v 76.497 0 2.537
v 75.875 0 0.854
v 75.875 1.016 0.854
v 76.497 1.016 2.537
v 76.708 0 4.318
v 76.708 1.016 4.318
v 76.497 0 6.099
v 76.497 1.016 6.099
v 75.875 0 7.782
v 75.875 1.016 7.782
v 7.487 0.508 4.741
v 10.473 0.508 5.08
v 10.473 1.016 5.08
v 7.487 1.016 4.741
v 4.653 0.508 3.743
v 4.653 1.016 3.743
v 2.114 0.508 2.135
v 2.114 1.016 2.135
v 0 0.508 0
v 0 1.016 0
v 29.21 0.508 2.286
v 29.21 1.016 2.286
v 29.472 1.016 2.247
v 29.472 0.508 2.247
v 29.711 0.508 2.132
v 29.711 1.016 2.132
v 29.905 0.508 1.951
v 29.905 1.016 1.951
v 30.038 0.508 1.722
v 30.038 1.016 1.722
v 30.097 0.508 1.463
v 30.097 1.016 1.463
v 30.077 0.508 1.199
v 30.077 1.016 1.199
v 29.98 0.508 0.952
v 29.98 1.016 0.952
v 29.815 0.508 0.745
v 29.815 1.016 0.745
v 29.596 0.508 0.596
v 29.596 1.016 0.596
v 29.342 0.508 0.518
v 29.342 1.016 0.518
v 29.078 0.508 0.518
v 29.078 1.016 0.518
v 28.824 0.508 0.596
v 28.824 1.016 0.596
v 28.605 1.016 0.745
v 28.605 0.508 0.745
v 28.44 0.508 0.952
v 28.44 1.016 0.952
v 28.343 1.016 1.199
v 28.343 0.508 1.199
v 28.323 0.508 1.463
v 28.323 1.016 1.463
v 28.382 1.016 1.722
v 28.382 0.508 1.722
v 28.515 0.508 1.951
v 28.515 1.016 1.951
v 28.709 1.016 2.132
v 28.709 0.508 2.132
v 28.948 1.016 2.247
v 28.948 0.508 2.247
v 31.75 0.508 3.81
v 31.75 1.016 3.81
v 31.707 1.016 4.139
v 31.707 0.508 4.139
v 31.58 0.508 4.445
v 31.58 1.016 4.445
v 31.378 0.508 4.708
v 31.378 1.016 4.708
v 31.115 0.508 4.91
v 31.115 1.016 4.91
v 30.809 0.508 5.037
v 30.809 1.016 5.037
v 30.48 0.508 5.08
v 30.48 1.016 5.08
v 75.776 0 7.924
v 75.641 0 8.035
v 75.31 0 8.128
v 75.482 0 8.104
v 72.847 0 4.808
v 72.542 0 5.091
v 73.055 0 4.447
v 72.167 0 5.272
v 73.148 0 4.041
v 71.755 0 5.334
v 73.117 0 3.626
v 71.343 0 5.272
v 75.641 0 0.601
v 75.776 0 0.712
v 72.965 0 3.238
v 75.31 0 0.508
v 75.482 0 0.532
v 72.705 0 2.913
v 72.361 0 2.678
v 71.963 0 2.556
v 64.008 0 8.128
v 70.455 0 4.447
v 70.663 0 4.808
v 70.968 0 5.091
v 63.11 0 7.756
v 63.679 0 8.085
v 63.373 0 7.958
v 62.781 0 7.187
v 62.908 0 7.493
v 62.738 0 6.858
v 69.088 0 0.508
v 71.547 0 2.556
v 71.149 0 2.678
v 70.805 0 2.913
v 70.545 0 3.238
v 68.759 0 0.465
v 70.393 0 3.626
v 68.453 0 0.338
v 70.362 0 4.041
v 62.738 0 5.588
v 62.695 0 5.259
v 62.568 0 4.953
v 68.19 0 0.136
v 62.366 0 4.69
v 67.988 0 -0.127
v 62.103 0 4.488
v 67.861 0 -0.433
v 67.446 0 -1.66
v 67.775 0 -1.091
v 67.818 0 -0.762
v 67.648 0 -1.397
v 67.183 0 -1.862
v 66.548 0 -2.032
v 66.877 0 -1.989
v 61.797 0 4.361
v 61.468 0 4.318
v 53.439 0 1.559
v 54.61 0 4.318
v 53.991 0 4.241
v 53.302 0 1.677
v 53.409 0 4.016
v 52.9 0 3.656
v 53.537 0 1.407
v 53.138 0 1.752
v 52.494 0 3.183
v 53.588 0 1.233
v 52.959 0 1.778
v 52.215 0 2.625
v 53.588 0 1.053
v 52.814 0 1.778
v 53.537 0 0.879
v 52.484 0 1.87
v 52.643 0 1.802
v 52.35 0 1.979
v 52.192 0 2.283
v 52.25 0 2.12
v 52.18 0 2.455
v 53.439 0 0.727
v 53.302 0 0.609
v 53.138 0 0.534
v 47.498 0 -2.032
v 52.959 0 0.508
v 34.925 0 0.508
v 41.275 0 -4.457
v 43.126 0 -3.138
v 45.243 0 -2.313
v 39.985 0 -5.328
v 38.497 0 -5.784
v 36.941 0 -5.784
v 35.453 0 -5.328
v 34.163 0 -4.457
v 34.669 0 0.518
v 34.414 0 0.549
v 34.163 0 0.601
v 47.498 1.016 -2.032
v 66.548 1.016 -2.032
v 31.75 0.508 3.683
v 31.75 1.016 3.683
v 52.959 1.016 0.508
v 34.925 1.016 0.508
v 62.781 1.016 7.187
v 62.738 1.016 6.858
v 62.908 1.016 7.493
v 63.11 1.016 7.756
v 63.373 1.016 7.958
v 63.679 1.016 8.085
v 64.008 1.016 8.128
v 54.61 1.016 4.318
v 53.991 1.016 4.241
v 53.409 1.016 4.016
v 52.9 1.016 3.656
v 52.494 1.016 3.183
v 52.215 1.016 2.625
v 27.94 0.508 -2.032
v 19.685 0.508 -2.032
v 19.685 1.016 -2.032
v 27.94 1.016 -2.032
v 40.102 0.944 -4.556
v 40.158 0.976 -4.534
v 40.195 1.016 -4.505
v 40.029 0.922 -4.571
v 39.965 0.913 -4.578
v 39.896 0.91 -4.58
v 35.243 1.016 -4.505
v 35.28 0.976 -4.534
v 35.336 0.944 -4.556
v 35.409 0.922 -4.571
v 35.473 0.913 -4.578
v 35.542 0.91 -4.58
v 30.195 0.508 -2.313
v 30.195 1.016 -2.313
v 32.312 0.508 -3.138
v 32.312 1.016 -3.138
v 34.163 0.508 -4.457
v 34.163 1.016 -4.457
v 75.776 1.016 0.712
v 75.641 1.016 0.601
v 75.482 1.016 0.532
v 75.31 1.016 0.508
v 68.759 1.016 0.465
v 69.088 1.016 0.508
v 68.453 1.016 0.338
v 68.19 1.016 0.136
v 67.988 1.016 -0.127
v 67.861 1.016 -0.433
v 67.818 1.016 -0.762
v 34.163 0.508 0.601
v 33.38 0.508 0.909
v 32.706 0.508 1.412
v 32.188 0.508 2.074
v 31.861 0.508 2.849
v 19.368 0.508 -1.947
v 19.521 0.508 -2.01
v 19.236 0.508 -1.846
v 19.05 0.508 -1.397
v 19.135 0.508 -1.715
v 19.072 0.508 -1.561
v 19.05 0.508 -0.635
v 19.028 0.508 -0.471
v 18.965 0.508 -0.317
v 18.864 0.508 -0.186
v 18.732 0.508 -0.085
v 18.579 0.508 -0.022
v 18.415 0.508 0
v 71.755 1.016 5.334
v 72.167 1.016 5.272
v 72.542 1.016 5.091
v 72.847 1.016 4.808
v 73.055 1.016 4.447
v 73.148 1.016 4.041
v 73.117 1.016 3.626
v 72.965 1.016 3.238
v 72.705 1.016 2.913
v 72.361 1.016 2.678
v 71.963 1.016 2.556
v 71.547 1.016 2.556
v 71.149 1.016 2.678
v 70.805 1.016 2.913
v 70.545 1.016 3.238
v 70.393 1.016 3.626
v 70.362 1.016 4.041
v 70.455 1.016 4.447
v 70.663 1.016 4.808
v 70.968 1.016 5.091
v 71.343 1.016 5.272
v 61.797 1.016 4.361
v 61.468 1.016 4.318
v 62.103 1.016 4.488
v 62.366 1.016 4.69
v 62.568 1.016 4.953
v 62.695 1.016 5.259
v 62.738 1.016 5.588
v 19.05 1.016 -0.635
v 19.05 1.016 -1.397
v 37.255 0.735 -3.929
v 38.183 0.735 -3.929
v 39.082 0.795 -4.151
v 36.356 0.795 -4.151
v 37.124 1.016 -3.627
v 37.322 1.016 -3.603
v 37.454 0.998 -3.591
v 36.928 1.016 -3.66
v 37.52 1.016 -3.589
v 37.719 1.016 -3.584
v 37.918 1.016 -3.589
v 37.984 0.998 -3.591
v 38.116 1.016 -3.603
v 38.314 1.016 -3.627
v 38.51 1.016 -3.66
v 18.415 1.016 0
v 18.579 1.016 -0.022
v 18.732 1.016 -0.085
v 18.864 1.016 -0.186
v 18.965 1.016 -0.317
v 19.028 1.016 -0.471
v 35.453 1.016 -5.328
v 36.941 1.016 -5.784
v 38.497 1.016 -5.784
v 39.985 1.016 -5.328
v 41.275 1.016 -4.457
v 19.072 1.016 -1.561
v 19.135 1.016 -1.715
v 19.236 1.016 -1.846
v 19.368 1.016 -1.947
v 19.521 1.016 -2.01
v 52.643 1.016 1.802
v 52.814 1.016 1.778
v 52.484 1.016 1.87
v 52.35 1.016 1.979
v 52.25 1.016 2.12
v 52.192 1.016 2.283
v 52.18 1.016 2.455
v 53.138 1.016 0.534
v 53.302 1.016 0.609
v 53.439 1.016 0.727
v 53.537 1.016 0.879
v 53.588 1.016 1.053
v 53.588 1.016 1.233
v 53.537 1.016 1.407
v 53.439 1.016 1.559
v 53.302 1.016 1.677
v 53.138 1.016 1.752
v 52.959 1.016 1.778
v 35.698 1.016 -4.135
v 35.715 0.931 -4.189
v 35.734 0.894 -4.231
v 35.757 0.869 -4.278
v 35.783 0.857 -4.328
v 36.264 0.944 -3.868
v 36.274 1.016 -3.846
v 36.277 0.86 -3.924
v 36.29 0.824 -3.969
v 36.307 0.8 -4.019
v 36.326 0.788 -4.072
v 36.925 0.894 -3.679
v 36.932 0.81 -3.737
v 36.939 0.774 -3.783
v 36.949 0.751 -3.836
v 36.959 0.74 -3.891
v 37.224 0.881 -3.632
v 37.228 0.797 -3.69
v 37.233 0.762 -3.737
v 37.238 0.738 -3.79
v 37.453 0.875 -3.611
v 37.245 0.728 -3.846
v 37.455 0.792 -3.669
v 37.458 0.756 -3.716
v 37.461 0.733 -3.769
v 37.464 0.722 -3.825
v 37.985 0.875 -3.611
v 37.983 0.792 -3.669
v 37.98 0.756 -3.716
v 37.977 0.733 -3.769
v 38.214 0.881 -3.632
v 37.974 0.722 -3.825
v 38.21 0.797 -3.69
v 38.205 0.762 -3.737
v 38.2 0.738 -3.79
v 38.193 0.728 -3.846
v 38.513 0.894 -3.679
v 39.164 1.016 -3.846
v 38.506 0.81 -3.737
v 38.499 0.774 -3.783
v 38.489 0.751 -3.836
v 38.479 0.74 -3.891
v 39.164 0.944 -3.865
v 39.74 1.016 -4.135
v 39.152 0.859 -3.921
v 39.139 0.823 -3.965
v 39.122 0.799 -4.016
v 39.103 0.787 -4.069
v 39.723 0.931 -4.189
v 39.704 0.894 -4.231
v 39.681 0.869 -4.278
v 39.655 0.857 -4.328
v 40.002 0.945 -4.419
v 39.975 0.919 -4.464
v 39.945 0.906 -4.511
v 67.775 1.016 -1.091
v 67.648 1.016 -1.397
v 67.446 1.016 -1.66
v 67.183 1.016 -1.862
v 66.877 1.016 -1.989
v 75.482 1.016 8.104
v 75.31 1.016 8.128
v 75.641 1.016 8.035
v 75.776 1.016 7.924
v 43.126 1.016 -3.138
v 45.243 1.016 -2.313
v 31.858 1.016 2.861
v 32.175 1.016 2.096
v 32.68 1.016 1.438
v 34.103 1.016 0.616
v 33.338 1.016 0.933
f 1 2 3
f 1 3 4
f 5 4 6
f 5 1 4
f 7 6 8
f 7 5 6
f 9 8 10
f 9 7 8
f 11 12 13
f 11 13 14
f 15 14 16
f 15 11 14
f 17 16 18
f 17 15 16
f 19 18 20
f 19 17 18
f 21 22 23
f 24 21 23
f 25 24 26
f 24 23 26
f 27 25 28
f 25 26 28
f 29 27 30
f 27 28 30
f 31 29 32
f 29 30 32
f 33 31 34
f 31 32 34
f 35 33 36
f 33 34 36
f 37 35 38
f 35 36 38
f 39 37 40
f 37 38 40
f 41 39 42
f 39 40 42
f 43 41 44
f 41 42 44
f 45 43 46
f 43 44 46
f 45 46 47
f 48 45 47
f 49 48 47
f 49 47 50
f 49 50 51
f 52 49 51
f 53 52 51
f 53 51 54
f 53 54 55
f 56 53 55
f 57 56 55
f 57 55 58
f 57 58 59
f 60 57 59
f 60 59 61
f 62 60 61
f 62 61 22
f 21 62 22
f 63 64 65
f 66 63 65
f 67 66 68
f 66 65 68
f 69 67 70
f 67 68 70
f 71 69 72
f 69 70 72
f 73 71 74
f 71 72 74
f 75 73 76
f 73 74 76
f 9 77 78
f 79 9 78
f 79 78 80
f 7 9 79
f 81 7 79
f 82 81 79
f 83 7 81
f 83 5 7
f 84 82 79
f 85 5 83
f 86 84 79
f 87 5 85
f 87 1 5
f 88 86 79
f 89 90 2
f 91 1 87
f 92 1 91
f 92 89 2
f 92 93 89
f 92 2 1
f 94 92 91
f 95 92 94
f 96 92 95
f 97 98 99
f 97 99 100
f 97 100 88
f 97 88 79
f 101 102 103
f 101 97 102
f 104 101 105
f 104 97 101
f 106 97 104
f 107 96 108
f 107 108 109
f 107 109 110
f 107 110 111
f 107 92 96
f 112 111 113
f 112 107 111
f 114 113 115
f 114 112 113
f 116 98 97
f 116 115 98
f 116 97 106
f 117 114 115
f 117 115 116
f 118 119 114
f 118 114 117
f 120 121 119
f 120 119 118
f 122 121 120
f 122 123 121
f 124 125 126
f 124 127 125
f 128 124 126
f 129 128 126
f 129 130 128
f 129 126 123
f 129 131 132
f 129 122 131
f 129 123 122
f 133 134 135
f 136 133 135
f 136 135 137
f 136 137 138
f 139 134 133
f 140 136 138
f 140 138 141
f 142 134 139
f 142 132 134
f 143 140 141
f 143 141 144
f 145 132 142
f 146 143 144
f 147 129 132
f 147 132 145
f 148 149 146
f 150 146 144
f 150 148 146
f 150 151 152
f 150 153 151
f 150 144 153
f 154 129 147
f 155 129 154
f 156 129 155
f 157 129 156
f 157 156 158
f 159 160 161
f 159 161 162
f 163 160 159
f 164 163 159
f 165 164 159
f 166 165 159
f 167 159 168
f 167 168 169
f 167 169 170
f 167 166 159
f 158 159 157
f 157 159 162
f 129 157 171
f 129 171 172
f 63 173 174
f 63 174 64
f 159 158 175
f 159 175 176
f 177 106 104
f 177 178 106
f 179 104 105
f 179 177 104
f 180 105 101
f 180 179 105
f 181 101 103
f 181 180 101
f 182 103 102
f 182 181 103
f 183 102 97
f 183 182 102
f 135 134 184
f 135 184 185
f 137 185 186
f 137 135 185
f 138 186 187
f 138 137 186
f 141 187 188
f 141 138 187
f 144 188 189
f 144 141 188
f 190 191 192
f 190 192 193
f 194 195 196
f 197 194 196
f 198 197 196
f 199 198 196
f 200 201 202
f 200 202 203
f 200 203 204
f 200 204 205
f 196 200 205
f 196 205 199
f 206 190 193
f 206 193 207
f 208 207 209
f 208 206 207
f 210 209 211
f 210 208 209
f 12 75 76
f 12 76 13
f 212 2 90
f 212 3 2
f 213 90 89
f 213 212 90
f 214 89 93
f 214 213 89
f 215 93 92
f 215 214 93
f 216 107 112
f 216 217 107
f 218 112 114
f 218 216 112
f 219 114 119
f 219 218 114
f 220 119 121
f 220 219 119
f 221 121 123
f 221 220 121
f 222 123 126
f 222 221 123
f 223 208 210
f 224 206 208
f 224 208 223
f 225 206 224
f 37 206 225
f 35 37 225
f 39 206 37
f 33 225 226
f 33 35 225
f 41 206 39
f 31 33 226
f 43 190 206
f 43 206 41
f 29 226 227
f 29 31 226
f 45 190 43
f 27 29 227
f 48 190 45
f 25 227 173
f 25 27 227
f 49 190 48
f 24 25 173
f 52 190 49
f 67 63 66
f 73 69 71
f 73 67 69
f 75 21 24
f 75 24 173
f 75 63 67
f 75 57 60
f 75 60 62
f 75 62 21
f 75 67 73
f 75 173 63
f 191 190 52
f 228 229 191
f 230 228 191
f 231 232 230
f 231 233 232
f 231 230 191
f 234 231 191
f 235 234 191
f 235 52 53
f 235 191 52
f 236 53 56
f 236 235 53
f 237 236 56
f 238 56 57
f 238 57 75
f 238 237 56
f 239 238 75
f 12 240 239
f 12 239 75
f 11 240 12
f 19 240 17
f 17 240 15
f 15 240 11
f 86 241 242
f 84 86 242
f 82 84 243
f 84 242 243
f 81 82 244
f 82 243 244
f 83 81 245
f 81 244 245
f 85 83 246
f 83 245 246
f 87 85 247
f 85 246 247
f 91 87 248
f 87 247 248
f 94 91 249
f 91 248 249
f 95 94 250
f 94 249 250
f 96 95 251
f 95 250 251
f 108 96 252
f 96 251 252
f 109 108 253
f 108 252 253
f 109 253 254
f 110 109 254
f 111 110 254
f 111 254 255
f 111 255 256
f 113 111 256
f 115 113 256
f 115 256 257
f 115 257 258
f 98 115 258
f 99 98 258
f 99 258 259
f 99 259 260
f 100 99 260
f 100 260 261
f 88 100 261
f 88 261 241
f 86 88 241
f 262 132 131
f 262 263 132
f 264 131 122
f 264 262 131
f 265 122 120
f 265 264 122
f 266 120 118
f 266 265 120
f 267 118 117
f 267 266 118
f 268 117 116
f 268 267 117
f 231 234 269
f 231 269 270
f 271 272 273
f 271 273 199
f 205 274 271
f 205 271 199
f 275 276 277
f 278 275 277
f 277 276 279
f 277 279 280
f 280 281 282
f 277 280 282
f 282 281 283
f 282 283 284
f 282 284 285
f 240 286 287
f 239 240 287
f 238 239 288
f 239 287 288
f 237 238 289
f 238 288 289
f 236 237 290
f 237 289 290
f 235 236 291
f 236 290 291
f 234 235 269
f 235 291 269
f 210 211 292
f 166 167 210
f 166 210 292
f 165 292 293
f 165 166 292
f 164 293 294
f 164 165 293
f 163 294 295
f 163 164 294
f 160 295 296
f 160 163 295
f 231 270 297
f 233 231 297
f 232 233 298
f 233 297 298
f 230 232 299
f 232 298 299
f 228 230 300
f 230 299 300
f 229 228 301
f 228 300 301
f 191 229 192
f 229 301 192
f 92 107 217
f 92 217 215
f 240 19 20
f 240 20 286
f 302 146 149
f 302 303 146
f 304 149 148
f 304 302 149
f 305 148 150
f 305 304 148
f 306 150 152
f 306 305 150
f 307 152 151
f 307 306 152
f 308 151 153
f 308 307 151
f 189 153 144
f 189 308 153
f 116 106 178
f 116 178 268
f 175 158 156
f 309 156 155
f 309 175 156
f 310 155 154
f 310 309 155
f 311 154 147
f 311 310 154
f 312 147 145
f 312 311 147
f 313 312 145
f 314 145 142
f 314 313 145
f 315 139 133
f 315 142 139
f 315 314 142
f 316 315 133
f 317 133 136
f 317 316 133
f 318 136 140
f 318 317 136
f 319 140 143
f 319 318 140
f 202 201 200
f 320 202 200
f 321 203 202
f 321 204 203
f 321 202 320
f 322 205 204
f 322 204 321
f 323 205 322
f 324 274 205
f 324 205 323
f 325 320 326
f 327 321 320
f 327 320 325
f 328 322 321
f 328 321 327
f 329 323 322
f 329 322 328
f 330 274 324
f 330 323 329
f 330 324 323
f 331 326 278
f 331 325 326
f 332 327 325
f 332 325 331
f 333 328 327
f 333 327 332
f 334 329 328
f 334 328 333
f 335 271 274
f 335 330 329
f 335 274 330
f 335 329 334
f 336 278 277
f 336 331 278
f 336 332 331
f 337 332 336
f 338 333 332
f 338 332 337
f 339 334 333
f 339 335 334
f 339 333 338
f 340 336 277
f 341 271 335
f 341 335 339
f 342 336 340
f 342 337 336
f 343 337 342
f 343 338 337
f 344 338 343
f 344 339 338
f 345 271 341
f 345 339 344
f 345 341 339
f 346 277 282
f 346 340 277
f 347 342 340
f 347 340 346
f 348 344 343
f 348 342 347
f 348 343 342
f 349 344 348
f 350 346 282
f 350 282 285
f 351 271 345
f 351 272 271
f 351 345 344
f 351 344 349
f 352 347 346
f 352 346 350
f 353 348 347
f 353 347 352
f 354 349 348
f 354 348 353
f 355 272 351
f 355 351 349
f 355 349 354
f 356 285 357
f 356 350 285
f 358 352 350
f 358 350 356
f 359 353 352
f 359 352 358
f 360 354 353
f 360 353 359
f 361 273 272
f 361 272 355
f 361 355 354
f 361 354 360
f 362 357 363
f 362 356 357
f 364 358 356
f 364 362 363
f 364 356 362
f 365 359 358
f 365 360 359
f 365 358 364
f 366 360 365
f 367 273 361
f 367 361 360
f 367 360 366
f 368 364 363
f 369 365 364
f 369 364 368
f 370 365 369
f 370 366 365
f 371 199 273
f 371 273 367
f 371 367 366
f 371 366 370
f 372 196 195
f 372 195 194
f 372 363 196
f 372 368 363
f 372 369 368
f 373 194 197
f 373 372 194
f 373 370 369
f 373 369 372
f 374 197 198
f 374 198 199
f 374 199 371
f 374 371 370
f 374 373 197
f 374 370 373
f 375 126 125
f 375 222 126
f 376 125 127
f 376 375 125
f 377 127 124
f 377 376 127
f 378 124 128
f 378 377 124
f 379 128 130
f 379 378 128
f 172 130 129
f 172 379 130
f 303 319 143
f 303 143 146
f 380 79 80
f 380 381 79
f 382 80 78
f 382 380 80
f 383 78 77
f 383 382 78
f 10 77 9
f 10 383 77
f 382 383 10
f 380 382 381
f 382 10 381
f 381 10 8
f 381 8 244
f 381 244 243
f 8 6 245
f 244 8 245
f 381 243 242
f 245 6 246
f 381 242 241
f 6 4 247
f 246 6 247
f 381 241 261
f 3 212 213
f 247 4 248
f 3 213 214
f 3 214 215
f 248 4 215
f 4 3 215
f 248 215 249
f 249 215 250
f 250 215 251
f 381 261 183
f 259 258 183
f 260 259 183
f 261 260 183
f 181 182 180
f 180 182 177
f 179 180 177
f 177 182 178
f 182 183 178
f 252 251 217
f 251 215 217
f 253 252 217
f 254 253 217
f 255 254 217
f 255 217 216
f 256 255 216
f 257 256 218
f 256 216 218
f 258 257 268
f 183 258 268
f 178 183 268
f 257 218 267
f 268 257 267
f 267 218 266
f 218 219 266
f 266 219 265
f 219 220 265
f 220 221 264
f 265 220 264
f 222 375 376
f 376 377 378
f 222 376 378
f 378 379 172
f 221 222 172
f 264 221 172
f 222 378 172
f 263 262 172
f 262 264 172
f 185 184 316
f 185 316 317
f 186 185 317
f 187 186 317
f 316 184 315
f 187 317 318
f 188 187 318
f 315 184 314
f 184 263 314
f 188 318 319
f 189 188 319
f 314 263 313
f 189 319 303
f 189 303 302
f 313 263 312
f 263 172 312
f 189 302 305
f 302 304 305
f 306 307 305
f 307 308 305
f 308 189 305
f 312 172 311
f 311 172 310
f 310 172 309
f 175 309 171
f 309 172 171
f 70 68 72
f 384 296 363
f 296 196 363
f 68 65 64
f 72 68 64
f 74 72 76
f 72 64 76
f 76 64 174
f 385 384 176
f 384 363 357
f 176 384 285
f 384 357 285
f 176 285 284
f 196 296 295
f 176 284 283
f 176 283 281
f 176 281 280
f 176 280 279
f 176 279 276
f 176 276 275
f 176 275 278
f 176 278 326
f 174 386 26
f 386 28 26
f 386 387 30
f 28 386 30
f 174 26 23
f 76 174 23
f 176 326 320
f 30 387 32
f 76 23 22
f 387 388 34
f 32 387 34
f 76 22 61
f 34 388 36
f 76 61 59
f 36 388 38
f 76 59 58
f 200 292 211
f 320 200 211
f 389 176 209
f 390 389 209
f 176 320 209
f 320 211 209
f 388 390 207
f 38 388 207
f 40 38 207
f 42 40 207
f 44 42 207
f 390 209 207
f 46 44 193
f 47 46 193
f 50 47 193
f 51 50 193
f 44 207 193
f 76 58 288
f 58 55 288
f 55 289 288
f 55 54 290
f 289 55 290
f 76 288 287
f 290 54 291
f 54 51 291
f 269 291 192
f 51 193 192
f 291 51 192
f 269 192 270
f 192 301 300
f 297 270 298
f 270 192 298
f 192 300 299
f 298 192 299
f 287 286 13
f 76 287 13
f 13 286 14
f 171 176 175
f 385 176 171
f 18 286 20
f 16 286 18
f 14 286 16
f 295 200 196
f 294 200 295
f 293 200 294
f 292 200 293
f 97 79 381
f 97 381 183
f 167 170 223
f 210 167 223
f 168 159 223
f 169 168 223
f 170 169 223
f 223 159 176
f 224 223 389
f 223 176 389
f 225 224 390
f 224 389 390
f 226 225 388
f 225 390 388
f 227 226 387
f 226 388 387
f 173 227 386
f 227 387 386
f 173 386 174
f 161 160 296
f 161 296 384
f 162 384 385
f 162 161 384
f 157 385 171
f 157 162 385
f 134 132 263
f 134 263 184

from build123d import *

# Parameters (mm, degrees)
BOSS_EXTRUDE1_DEPTH    = 1.016
CUT_EXTRUDE1_DEPTH     = 78.144111272
FILLET1_R              = 0.635
FILLET2_R              = 1.27
FILLET3_R              = 0.635
SKETCH3_R              = 1.397
CUT_EXTRUDE2_DEPTH     = 78.144111272
CUT_EXTRUDE3_DEPTH     = 0.360211591
CUT_EXTRUDE3_TAPER     = 20
FILLET4_R              = 0.254
FILLET5_R              = 3.175
SKETCH5_R              = 0.889
CUT_EXTRUDE4_DEPTH     = 78.144111382
CUT_EXTRUDE5_OUTLINE_W = 0.508
CUT_EXTRUDE5_OUTLINE_H = 11.08
CUT_EXTRUDE5_DEPTH     = 34.163


# Read off the part's stored shape, not the designer's step: Cut-Extrude3, Cut-Extrude5
with BuildPart() as part:
    # Sketch1 → Boss-Extrude1 (new body)
    with BuildSketch(Plane(origin=(0, 0, 0), x_dir=(1, 0, 0), z_dir=(0, 1, 0))):
        with BuildLine():
            Line((0, 0), (19.05, 0))
            Line((19.05, 0), (19.05, 2.032))
            Line((19.05, 2.032), (27.94, 2.032))
            ThreePointArc((27.94, 2.032), (31.279316908, 2.659542662), (34.163, 4.456545455))
            ThreePointArc((34.163, 4.456545455), (37.719, 5.842), (41.275, 4.456545455))
            ThreePointArc((41.275, 4.456545455), (44.158683092, 2.659542662), (47.498, 2.032))
            Line((47.498, 2.032), (67.818, 2.032))
            Line((67.818, 2.032), (67.818, -0.508))
            Line((67.818, -0.508), (75.687113577, -0.508))
            ThreePointArc((75.687113577, -0.508), (76.708, -4.318), (75.687113577, -8.128))
            Line((75.687113577, -8.128), (62.738, -8.128))
            Line((62.738, -8.128), (62.738, -4.318))
            Line((62.738, -4.318), (54.61, -4.318))
            ThreePointArc((54.61, -4.318), (52.813948776, -3.574051224), (52.07, -1.778))
            Line((52.07, -1.778), (52.07, -0.508))
            Line((52.07, -0.508), (31.75, -0.508))
            Line((31.75, -0.508), (31.75, -5.08))
            Line((31.75, -5.08), (10.472688289, -5.08))
            ThreePointArc((10.472688289, -5.08), (4.652817156, -3.742971704), (0, 0))
        make_face()
    extrude(amount=BOSS_EXTRUDE1_DEPTH)

    # Sketch2 → Cut-Extrude1 (cut, through all)
    with BuildSketch(Plane(origin=(0, 1.016, 0), x_dir=(1, 0, 0), z_dir=(0, 1, 0))):
        with BuildLine():
            Line((52.959, -1.778), (52.07, -1.778))
            Line((52.07, -1.778), (52.07, -0.508))
            Line((52.07, -0.508), (52.959, -0.508))
            ThreePointArc((52.959, -0.508), (53.594, -1.143), (52.959, -1.778))
        make_face()
    extrude(amount=-CUT_EXTRUDE1_DEPTH, mode=Mode.SUBTRACT)

    # Fillet1
    fillet1_edges = [part.edges().sort_by_distance(p)[0] for p in [
        (52.07, 0.508, 1.778),
    ]]
    fillet(fillet1_edges, radius=FILLET1_R)

    # Fillet2
    fillet2_edges = [part.edges().sort_by_distance(p)[0] for p in [
        (67.818, 0.508, 0.508),
        (67.818, 0.508, -2.032),
        (62.738, 0.508, 8.128),
        (62.738, 0.508, 4.318),
        (31.75, 0.508, 5.08),
    ]]
    fillet(fillet2_edges, radius=FILLET2_R - 0.0001)  # a hair under: the kernel refuses the full size

    # Fillet3
    fillet3_edges = [part.edges().sort_by_distance(p)[0] for p in [
        (19.05, 0.508, 0),
        (19.05, 0.508, -2.032),
        (75.687113577, 0.508, 0.508),
        (75.687113577, 0.508, 8.128),
    ]]
    fillet(fillet3_edges, radius=FILLET3_R)

    # Sketch3 → Cut-Extrude2 (cut, through all)
    with BuildSketch(Plane(origin=(0, 1.016, 0), x_dir=(1, 0, 0), z_dir=(0, 1, 0))):
        with Locations(Location((71.755, -3.937, 0), (0, 0, 270))):
            Circle(SKETCH3_R)
    extrude(amount=-CUT_EXTRUDE2_DEPTH, mode=Mode.SUBTRACT)

    # Cut-Extrude3 outline → Cut-Extrude3 (cut)
    with BuildSketch(Plane(origin=(0, -0.296094575, -0.079338302), x_dir=(-1, 0, 0), z_dir=(0, 0.9659258262890681, 0.25881904510252135))):
        with BuildLine():
            ThreePointArc((-34.967158874, -4.659244146), (-37.719, -3.594110297), (-40.470841126, -4.659244146))
            Line((-40.470841126, -4.659244146), (-34.967158874, -4.659244146))
        make_face()
    extrude(amount=CUT_EXTRUDE3_DEPTH, taper=CUT_EXTRUDE3_TAPER, mode=Mode.SUBTRACT)

    # Fillet4
    fillet4_edges = [part.edges().sort_by_distance(p)[0] for p in [
        (37.719, 0.63412962, -3.55098226),
    ]]
    fillet(fillet4_edges, radius=FILLET4_R - 0.0001)  # a hair under: the kernel refuses the full size

    # Fillet5
    fillet5_edges = [part.edges().sort_by_distance(p)[0] for p in [
        (31.75, 0.508, 0.508),
    ]]
    fillet(fillet5_edges, radius=FILLET5_R)

    # Sketch5 → Cut-Extrude4 (cut, through all)
    with BuildSketch(Plane(origin=(0, 1.016, 0), x_dir=(1, 0, 0), z_dir=(0, 1, 0))):
        with Locations(Location((29.21, -1.397, 0), (0, 0, 270))):
            Circle(SKETCH5_R)
    extrude(amount=-CUT_EXTRUDE4_DEPTH, mode=Mode.SUBTRACT)

    # Cut-Extrude5 outline → Cut-Extrude5 (cut)
    with BuildSketch(Plane.YZ):
        with Locations((0.254, -0.46)):
            Rectangle(CUT_EXTRUDE5_OUTLINE_W, CUT_EXTRUDE5_OUTLINE_H)
    extrude(amount=CUT_EXTRUDE5_DEPTH, mode=Mode.SUBTRACT)


solid = part.part
